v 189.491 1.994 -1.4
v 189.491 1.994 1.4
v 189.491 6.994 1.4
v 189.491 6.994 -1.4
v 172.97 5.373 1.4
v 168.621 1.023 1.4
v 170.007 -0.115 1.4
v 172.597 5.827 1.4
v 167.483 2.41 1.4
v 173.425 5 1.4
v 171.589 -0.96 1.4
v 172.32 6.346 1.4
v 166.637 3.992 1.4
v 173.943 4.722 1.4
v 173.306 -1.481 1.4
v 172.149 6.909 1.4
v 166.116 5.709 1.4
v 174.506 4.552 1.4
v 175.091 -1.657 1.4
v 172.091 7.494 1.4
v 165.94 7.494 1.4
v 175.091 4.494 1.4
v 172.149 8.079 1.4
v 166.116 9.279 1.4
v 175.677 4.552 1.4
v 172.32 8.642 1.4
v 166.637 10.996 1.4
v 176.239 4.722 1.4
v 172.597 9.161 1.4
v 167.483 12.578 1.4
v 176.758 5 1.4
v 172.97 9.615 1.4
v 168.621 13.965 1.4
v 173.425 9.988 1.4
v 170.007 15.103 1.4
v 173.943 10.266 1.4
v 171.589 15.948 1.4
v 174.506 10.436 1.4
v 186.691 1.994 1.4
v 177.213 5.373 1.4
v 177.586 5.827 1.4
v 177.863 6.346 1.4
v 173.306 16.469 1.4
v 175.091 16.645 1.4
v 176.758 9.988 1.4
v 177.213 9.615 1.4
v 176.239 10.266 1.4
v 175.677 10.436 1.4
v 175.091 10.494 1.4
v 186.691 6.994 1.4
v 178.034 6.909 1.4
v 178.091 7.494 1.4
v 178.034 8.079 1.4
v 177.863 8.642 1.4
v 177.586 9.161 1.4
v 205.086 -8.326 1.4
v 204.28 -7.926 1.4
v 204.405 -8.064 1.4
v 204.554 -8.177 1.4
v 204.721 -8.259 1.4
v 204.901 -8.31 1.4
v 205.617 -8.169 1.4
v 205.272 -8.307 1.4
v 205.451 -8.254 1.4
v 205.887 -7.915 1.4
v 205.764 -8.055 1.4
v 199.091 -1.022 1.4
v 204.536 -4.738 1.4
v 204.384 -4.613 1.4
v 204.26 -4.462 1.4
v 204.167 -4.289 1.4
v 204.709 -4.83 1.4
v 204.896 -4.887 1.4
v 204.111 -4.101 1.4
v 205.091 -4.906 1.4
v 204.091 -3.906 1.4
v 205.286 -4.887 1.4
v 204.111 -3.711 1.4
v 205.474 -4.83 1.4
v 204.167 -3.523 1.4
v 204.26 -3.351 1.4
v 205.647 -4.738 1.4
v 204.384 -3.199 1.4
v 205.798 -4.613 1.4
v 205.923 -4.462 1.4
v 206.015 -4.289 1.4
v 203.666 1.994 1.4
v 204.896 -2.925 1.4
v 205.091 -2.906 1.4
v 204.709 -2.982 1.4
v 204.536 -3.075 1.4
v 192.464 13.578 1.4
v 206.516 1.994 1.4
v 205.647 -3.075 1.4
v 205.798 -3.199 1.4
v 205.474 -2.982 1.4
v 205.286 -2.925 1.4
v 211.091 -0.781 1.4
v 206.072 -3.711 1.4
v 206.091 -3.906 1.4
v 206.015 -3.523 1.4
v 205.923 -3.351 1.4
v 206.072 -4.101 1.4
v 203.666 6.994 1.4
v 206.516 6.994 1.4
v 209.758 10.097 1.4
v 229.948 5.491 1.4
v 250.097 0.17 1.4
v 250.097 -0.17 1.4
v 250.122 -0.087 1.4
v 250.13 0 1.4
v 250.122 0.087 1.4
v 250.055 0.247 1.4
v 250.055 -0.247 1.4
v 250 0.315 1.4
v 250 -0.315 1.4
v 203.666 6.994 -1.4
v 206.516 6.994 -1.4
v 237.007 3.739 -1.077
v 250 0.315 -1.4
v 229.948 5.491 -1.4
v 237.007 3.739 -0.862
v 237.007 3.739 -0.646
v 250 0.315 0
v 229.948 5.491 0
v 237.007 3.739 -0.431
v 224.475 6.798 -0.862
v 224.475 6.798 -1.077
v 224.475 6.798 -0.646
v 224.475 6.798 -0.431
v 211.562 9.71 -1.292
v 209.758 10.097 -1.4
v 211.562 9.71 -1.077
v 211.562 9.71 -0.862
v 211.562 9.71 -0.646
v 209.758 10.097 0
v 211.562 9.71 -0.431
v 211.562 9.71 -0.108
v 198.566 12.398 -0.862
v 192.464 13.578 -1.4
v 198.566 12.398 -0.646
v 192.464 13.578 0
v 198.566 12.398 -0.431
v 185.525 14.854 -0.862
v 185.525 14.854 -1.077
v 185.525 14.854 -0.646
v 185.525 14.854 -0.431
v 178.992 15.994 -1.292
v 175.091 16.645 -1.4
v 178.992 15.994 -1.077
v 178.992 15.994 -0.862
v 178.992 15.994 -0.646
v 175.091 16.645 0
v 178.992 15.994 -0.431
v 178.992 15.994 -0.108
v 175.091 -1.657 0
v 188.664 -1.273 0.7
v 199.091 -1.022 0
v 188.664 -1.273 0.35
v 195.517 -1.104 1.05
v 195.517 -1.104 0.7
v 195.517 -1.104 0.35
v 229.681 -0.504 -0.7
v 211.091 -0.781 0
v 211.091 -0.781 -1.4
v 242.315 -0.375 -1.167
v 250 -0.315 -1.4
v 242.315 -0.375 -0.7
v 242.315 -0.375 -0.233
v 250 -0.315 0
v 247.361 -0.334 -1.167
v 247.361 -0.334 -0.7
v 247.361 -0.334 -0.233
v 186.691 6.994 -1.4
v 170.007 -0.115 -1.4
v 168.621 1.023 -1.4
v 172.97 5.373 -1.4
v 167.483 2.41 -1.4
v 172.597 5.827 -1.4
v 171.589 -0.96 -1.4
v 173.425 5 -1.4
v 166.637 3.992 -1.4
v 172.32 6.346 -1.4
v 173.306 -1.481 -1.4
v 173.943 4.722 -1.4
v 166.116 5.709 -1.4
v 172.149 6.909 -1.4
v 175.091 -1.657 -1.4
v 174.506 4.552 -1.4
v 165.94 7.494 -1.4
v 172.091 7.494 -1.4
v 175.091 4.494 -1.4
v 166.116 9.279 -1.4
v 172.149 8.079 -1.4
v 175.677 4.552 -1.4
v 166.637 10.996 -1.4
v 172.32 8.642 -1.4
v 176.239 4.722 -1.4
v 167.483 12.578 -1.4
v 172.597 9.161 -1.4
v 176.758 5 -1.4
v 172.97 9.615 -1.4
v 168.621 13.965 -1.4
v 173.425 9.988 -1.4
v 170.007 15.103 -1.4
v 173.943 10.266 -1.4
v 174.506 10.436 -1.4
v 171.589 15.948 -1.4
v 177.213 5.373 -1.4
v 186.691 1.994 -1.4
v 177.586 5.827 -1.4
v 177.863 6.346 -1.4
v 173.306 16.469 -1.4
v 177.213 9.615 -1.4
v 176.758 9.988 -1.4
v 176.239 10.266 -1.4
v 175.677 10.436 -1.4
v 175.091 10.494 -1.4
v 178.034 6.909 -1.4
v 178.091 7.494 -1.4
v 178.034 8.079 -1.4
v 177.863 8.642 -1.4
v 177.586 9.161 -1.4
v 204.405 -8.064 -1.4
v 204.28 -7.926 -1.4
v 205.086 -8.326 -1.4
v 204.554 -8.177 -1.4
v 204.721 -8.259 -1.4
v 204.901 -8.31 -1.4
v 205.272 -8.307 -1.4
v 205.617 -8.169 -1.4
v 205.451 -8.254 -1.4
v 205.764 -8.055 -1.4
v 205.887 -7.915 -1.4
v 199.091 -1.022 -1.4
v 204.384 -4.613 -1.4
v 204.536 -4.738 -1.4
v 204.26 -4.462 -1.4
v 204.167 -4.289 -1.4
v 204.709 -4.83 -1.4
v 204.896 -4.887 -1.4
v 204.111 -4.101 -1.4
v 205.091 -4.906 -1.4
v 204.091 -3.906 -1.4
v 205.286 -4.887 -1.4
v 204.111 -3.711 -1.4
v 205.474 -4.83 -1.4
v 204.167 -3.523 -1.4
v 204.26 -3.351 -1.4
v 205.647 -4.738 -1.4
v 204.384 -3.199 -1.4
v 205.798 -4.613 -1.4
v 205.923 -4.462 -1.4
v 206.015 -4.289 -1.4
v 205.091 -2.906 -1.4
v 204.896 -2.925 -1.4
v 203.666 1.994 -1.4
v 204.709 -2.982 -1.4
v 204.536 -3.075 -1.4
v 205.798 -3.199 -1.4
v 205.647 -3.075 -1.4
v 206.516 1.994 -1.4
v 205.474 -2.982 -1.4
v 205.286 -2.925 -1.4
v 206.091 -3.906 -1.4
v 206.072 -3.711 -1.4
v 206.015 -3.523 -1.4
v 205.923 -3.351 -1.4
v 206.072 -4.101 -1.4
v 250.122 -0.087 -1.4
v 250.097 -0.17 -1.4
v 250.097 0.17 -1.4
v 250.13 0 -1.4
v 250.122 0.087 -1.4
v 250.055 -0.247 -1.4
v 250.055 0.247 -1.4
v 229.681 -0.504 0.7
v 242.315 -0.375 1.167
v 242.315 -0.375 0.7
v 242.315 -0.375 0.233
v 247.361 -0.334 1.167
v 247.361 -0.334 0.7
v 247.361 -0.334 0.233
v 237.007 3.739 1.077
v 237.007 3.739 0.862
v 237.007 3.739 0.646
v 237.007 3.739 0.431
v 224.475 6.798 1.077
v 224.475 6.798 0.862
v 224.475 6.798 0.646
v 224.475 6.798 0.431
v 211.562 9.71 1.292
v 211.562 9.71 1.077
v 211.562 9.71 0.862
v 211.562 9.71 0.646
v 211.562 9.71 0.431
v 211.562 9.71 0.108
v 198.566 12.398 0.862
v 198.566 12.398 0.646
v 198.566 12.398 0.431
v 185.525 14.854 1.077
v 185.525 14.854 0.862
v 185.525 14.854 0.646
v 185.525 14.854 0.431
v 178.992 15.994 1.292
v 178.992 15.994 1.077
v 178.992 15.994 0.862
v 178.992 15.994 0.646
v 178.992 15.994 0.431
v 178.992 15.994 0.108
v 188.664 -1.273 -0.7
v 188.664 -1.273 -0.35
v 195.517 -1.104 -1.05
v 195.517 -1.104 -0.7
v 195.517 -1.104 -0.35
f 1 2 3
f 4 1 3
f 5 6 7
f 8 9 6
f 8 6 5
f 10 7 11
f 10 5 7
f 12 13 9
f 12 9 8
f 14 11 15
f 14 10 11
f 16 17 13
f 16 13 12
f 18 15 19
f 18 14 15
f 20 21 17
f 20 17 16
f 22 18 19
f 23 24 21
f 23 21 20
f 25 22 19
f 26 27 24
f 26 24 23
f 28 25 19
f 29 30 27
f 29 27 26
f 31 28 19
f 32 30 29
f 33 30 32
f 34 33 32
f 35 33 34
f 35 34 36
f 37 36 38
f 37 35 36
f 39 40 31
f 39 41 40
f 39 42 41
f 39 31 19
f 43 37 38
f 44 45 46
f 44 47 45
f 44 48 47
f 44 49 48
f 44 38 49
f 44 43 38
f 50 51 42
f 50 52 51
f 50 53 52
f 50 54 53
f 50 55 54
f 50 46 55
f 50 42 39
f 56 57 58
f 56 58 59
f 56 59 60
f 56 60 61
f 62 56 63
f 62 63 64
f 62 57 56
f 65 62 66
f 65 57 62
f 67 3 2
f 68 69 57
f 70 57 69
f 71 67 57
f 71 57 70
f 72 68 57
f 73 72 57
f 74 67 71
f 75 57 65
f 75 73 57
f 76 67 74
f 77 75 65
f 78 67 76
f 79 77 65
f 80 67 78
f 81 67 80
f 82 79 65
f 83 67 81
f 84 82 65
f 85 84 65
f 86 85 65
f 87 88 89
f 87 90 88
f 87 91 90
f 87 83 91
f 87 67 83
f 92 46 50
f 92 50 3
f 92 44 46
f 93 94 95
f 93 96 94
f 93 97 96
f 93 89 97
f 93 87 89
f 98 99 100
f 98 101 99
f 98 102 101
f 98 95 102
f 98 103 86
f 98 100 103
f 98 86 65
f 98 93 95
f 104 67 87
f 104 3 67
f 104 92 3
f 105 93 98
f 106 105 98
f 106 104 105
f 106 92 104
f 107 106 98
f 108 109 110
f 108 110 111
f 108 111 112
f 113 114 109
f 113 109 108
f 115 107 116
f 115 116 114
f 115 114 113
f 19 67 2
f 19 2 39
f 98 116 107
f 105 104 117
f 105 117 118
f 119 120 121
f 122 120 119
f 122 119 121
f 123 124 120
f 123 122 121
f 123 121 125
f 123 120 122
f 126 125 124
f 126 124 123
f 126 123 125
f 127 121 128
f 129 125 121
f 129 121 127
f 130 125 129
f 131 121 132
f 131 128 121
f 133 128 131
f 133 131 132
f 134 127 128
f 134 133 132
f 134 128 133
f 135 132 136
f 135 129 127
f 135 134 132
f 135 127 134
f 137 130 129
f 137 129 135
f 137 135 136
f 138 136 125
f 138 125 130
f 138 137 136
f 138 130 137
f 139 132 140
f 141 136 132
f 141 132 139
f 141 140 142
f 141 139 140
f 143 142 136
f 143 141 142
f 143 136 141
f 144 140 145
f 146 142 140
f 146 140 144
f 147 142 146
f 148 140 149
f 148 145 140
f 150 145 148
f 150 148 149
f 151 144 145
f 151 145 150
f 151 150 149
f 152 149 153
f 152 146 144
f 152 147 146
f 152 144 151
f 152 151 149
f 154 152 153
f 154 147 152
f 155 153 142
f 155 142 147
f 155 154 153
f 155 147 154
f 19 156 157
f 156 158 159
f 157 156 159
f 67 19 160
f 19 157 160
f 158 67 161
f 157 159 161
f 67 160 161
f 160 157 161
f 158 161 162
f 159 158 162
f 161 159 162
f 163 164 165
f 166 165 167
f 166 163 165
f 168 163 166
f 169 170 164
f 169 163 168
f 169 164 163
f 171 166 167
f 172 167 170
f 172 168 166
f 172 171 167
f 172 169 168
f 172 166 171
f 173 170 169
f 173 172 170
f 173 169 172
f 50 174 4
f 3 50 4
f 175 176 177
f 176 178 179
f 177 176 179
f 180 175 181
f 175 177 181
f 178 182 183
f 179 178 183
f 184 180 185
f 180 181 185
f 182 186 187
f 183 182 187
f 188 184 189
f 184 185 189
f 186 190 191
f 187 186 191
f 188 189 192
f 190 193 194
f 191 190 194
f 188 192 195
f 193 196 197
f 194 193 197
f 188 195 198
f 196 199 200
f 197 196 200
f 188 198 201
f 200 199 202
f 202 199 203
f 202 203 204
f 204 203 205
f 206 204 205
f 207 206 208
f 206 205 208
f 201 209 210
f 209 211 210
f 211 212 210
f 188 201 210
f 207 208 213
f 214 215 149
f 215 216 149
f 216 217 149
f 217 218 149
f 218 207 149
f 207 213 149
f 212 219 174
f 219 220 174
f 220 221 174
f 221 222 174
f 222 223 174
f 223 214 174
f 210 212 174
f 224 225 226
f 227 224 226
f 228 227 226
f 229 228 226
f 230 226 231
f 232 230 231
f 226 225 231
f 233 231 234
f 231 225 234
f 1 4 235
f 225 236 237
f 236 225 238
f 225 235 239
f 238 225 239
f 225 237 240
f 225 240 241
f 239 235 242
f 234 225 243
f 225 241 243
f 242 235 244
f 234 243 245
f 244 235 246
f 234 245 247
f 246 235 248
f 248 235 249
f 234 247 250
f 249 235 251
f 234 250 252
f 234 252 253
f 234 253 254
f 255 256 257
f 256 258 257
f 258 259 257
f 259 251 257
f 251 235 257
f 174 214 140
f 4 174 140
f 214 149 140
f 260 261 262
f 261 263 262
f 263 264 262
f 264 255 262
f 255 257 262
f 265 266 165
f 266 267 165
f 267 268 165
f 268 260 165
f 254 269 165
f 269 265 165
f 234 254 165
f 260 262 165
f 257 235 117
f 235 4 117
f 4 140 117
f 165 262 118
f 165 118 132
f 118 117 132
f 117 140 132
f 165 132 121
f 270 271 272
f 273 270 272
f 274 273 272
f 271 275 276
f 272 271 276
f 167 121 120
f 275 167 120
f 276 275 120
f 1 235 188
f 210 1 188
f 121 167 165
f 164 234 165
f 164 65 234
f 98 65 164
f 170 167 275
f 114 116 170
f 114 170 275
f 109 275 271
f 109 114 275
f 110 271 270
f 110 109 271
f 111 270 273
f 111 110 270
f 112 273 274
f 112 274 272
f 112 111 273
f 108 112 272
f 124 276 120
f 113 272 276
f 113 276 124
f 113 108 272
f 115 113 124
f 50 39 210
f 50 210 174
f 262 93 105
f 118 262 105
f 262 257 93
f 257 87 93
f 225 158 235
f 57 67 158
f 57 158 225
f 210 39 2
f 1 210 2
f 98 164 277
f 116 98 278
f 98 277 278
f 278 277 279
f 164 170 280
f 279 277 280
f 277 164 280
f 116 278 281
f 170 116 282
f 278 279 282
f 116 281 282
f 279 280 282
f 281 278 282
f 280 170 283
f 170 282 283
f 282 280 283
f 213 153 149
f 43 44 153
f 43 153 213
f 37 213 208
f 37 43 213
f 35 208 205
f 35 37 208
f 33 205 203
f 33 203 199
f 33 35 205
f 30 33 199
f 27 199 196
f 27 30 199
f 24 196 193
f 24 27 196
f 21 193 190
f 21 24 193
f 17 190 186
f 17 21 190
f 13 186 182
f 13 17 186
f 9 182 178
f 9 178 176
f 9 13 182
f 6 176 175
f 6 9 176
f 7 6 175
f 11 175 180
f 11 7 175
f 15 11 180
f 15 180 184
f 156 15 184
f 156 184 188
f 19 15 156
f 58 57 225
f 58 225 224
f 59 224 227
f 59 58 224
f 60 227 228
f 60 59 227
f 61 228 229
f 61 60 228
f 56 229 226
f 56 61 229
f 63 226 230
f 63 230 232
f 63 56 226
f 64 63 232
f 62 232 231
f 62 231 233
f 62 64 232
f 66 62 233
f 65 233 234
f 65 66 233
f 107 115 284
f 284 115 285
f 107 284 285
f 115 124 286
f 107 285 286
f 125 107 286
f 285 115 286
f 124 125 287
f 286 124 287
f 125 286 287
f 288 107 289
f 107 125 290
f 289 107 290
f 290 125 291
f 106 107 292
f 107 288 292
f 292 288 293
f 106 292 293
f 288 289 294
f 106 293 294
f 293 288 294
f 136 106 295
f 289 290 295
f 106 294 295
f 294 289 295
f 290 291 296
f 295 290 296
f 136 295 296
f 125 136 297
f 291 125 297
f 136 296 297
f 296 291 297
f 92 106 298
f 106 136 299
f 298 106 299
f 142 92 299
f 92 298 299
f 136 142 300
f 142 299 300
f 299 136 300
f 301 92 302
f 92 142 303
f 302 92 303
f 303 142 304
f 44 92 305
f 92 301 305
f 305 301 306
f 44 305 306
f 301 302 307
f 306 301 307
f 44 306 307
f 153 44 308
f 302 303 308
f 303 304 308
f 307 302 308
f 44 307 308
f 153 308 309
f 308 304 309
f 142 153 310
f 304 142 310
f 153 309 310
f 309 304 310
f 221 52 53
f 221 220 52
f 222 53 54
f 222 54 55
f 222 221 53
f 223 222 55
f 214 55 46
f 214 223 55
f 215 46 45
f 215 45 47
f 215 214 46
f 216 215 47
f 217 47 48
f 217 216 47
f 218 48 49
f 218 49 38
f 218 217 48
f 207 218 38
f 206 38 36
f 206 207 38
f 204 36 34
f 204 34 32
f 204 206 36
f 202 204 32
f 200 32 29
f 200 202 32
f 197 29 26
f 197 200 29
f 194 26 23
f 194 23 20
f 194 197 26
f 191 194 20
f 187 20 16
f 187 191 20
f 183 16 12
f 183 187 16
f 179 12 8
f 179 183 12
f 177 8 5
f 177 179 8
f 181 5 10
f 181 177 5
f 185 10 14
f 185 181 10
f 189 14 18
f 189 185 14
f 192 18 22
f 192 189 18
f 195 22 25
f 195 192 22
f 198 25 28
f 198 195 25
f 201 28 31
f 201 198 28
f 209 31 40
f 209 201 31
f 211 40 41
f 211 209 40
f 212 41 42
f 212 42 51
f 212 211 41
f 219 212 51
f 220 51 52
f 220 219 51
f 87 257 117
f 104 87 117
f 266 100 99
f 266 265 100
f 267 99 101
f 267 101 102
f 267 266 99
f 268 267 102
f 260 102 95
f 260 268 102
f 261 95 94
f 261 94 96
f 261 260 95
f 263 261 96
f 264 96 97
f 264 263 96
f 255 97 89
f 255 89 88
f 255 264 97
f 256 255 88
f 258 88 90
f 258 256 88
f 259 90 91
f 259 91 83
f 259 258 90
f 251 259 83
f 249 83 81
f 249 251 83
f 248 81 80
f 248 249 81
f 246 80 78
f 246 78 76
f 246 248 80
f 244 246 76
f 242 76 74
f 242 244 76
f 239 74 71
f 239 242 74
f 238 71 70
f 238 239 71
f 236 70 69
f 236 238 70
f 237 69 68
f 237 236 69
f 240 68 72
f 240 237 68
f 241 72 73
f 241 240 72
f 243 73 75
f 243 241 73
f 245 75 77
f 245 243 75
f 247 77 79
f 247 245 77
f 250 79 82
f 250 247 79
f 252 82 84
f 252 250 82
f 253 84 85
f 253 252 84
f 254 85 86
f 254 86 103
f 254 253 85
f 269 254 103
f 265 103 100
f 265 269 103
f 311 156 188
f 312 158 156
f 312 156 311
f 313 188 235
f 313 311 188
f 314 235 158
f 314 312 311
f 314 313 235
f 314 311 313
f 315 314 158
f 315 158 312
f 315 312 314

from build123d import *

# Parameters (mm, degrees)
SKETCH_1_R      = 1
SKETCH_1_R_2    = 3
SKETCH_1_W      = 2.8
SKETCH_1_H      = 5
SKETCH_1_W_2    = 2.85
EXTRUDE_1_DEPTH = 1.4


with BuildPart() as part:
    # Эскиз1 → Бобышка-Вытянуть1 (new, symmetric)
    with BuildSketch(Plane.XY):
        with BuildLine():
            ThreePointArc((175.091334091, 16.644787515), (168.620686799, 13.96455765), (165.940456932, 7.493910359))
            ThreePointArc((165.940456932, 7.493910359), (168.620686797, 1.023263065), (175.091334091, -1.656966802))
            add(Edge.make_bspline(
                [(175.091334091, -1.656966802), (177.330680613, -1.588466601), (181.854695323, -1.455127256), (188.663234462, -1.270383377), (194.423908611, -1.128102082), (197.899847219, -1.04871935), (199.091334091, -1.02226769)],
                knots=[0.704401069, 0.704401069, 0.704401069, 0.704401069, 0.730918775, 0.757971338, 0.785017763, 0.79912389, 0.79912389, 0.79912389, 0.79912389], degree=3))
            Line((199.091334091, -1.02226769), (204.279973699, -7.926463493))
            ThreePointArc((204.279973699, -7.926463493), (205.086497755, -8.325660965), (205.887265796, -7.915039218))
            Line((205.887265796, -7.915039218), (211.091334091, -0.78138581))
            add(Edge.make_bspline(
                [(211.091334091, -0.78138581), (215.029550732, -0.71061193), (221.226120504, -0.611852577), (229.617630172, -0.50292618), (236.087353854, -0.431514192), (241.980776913, -0.376520461), (246.558970011, -0.339535886), (249.120490965, -0.321271242), (250, -0.315)],
                knots=[0.846478182, 0.846478182, 0.846478182, 0.846478182, 0.893099152, 0.919831065, 0.945809917, 0.969680601, 0.989589706, 1, 1, 1, 1], degree=3))
            ThreePointArc((250, -0.315), (250.130477272, 0), (250, 0.315))
            add(Edge.make_bspline(
                [(250, 0.315), (249.15566774, 0.545019818), (246.720175698, 1.208516243), (242.391332083, 2.358339053), (236.849761204, 3.787625364), (230.779918279, 5.298008837), (224.455917947, 6.812866028), (218.030543496, 8.291610632), (211.562405045, 9.719735057), (205.072411509, 11.092374932), (198.567970913, 12.407850726), (192.052369914, 13.665297924), (185.527619973, 14.864093303), (179.872800983, 15.850364437), (176.392239334, 16.431323122), (175.091334091, 16.644787515)],
                knots=[0, 0, 0, 0, 0.0101622, 0.029313053, 0.052011605, 0.076619468, 0.101948061, 0.127526132, 0.153184131, 0.178867888, 0.204557903, 0.230245712, 0.255925967, 0.281594302, 0.296903142, 0.296903142, 0.296903142, 0.296903142], degree=3))
        make_face()
        with Locations((205.091334091, -3.906089643)):
            Circle(SKETCH_1_R, mode=Mode.SUBTRACT)
        with Locations((175.091334091, 7.493910357)):
            Circle(SKETCH_1_R_2, mode=Mode.SUBTRACT)
        with Locations((188.091334091, 4.493910357)):
            Rectangle(SKETCH_1_W, SKETCH_1_H, mode=Mode.SUBTRACT)
        with Locations((205.091334091, 4.493910357)):
            Rectangle(SKETCH_1_W_2, SKETCH_1_H, mode=Mode.SUBTRACT)
    extrude(amount=EXTRUDE_1_DEPTH, both=True)


solid = part.part
